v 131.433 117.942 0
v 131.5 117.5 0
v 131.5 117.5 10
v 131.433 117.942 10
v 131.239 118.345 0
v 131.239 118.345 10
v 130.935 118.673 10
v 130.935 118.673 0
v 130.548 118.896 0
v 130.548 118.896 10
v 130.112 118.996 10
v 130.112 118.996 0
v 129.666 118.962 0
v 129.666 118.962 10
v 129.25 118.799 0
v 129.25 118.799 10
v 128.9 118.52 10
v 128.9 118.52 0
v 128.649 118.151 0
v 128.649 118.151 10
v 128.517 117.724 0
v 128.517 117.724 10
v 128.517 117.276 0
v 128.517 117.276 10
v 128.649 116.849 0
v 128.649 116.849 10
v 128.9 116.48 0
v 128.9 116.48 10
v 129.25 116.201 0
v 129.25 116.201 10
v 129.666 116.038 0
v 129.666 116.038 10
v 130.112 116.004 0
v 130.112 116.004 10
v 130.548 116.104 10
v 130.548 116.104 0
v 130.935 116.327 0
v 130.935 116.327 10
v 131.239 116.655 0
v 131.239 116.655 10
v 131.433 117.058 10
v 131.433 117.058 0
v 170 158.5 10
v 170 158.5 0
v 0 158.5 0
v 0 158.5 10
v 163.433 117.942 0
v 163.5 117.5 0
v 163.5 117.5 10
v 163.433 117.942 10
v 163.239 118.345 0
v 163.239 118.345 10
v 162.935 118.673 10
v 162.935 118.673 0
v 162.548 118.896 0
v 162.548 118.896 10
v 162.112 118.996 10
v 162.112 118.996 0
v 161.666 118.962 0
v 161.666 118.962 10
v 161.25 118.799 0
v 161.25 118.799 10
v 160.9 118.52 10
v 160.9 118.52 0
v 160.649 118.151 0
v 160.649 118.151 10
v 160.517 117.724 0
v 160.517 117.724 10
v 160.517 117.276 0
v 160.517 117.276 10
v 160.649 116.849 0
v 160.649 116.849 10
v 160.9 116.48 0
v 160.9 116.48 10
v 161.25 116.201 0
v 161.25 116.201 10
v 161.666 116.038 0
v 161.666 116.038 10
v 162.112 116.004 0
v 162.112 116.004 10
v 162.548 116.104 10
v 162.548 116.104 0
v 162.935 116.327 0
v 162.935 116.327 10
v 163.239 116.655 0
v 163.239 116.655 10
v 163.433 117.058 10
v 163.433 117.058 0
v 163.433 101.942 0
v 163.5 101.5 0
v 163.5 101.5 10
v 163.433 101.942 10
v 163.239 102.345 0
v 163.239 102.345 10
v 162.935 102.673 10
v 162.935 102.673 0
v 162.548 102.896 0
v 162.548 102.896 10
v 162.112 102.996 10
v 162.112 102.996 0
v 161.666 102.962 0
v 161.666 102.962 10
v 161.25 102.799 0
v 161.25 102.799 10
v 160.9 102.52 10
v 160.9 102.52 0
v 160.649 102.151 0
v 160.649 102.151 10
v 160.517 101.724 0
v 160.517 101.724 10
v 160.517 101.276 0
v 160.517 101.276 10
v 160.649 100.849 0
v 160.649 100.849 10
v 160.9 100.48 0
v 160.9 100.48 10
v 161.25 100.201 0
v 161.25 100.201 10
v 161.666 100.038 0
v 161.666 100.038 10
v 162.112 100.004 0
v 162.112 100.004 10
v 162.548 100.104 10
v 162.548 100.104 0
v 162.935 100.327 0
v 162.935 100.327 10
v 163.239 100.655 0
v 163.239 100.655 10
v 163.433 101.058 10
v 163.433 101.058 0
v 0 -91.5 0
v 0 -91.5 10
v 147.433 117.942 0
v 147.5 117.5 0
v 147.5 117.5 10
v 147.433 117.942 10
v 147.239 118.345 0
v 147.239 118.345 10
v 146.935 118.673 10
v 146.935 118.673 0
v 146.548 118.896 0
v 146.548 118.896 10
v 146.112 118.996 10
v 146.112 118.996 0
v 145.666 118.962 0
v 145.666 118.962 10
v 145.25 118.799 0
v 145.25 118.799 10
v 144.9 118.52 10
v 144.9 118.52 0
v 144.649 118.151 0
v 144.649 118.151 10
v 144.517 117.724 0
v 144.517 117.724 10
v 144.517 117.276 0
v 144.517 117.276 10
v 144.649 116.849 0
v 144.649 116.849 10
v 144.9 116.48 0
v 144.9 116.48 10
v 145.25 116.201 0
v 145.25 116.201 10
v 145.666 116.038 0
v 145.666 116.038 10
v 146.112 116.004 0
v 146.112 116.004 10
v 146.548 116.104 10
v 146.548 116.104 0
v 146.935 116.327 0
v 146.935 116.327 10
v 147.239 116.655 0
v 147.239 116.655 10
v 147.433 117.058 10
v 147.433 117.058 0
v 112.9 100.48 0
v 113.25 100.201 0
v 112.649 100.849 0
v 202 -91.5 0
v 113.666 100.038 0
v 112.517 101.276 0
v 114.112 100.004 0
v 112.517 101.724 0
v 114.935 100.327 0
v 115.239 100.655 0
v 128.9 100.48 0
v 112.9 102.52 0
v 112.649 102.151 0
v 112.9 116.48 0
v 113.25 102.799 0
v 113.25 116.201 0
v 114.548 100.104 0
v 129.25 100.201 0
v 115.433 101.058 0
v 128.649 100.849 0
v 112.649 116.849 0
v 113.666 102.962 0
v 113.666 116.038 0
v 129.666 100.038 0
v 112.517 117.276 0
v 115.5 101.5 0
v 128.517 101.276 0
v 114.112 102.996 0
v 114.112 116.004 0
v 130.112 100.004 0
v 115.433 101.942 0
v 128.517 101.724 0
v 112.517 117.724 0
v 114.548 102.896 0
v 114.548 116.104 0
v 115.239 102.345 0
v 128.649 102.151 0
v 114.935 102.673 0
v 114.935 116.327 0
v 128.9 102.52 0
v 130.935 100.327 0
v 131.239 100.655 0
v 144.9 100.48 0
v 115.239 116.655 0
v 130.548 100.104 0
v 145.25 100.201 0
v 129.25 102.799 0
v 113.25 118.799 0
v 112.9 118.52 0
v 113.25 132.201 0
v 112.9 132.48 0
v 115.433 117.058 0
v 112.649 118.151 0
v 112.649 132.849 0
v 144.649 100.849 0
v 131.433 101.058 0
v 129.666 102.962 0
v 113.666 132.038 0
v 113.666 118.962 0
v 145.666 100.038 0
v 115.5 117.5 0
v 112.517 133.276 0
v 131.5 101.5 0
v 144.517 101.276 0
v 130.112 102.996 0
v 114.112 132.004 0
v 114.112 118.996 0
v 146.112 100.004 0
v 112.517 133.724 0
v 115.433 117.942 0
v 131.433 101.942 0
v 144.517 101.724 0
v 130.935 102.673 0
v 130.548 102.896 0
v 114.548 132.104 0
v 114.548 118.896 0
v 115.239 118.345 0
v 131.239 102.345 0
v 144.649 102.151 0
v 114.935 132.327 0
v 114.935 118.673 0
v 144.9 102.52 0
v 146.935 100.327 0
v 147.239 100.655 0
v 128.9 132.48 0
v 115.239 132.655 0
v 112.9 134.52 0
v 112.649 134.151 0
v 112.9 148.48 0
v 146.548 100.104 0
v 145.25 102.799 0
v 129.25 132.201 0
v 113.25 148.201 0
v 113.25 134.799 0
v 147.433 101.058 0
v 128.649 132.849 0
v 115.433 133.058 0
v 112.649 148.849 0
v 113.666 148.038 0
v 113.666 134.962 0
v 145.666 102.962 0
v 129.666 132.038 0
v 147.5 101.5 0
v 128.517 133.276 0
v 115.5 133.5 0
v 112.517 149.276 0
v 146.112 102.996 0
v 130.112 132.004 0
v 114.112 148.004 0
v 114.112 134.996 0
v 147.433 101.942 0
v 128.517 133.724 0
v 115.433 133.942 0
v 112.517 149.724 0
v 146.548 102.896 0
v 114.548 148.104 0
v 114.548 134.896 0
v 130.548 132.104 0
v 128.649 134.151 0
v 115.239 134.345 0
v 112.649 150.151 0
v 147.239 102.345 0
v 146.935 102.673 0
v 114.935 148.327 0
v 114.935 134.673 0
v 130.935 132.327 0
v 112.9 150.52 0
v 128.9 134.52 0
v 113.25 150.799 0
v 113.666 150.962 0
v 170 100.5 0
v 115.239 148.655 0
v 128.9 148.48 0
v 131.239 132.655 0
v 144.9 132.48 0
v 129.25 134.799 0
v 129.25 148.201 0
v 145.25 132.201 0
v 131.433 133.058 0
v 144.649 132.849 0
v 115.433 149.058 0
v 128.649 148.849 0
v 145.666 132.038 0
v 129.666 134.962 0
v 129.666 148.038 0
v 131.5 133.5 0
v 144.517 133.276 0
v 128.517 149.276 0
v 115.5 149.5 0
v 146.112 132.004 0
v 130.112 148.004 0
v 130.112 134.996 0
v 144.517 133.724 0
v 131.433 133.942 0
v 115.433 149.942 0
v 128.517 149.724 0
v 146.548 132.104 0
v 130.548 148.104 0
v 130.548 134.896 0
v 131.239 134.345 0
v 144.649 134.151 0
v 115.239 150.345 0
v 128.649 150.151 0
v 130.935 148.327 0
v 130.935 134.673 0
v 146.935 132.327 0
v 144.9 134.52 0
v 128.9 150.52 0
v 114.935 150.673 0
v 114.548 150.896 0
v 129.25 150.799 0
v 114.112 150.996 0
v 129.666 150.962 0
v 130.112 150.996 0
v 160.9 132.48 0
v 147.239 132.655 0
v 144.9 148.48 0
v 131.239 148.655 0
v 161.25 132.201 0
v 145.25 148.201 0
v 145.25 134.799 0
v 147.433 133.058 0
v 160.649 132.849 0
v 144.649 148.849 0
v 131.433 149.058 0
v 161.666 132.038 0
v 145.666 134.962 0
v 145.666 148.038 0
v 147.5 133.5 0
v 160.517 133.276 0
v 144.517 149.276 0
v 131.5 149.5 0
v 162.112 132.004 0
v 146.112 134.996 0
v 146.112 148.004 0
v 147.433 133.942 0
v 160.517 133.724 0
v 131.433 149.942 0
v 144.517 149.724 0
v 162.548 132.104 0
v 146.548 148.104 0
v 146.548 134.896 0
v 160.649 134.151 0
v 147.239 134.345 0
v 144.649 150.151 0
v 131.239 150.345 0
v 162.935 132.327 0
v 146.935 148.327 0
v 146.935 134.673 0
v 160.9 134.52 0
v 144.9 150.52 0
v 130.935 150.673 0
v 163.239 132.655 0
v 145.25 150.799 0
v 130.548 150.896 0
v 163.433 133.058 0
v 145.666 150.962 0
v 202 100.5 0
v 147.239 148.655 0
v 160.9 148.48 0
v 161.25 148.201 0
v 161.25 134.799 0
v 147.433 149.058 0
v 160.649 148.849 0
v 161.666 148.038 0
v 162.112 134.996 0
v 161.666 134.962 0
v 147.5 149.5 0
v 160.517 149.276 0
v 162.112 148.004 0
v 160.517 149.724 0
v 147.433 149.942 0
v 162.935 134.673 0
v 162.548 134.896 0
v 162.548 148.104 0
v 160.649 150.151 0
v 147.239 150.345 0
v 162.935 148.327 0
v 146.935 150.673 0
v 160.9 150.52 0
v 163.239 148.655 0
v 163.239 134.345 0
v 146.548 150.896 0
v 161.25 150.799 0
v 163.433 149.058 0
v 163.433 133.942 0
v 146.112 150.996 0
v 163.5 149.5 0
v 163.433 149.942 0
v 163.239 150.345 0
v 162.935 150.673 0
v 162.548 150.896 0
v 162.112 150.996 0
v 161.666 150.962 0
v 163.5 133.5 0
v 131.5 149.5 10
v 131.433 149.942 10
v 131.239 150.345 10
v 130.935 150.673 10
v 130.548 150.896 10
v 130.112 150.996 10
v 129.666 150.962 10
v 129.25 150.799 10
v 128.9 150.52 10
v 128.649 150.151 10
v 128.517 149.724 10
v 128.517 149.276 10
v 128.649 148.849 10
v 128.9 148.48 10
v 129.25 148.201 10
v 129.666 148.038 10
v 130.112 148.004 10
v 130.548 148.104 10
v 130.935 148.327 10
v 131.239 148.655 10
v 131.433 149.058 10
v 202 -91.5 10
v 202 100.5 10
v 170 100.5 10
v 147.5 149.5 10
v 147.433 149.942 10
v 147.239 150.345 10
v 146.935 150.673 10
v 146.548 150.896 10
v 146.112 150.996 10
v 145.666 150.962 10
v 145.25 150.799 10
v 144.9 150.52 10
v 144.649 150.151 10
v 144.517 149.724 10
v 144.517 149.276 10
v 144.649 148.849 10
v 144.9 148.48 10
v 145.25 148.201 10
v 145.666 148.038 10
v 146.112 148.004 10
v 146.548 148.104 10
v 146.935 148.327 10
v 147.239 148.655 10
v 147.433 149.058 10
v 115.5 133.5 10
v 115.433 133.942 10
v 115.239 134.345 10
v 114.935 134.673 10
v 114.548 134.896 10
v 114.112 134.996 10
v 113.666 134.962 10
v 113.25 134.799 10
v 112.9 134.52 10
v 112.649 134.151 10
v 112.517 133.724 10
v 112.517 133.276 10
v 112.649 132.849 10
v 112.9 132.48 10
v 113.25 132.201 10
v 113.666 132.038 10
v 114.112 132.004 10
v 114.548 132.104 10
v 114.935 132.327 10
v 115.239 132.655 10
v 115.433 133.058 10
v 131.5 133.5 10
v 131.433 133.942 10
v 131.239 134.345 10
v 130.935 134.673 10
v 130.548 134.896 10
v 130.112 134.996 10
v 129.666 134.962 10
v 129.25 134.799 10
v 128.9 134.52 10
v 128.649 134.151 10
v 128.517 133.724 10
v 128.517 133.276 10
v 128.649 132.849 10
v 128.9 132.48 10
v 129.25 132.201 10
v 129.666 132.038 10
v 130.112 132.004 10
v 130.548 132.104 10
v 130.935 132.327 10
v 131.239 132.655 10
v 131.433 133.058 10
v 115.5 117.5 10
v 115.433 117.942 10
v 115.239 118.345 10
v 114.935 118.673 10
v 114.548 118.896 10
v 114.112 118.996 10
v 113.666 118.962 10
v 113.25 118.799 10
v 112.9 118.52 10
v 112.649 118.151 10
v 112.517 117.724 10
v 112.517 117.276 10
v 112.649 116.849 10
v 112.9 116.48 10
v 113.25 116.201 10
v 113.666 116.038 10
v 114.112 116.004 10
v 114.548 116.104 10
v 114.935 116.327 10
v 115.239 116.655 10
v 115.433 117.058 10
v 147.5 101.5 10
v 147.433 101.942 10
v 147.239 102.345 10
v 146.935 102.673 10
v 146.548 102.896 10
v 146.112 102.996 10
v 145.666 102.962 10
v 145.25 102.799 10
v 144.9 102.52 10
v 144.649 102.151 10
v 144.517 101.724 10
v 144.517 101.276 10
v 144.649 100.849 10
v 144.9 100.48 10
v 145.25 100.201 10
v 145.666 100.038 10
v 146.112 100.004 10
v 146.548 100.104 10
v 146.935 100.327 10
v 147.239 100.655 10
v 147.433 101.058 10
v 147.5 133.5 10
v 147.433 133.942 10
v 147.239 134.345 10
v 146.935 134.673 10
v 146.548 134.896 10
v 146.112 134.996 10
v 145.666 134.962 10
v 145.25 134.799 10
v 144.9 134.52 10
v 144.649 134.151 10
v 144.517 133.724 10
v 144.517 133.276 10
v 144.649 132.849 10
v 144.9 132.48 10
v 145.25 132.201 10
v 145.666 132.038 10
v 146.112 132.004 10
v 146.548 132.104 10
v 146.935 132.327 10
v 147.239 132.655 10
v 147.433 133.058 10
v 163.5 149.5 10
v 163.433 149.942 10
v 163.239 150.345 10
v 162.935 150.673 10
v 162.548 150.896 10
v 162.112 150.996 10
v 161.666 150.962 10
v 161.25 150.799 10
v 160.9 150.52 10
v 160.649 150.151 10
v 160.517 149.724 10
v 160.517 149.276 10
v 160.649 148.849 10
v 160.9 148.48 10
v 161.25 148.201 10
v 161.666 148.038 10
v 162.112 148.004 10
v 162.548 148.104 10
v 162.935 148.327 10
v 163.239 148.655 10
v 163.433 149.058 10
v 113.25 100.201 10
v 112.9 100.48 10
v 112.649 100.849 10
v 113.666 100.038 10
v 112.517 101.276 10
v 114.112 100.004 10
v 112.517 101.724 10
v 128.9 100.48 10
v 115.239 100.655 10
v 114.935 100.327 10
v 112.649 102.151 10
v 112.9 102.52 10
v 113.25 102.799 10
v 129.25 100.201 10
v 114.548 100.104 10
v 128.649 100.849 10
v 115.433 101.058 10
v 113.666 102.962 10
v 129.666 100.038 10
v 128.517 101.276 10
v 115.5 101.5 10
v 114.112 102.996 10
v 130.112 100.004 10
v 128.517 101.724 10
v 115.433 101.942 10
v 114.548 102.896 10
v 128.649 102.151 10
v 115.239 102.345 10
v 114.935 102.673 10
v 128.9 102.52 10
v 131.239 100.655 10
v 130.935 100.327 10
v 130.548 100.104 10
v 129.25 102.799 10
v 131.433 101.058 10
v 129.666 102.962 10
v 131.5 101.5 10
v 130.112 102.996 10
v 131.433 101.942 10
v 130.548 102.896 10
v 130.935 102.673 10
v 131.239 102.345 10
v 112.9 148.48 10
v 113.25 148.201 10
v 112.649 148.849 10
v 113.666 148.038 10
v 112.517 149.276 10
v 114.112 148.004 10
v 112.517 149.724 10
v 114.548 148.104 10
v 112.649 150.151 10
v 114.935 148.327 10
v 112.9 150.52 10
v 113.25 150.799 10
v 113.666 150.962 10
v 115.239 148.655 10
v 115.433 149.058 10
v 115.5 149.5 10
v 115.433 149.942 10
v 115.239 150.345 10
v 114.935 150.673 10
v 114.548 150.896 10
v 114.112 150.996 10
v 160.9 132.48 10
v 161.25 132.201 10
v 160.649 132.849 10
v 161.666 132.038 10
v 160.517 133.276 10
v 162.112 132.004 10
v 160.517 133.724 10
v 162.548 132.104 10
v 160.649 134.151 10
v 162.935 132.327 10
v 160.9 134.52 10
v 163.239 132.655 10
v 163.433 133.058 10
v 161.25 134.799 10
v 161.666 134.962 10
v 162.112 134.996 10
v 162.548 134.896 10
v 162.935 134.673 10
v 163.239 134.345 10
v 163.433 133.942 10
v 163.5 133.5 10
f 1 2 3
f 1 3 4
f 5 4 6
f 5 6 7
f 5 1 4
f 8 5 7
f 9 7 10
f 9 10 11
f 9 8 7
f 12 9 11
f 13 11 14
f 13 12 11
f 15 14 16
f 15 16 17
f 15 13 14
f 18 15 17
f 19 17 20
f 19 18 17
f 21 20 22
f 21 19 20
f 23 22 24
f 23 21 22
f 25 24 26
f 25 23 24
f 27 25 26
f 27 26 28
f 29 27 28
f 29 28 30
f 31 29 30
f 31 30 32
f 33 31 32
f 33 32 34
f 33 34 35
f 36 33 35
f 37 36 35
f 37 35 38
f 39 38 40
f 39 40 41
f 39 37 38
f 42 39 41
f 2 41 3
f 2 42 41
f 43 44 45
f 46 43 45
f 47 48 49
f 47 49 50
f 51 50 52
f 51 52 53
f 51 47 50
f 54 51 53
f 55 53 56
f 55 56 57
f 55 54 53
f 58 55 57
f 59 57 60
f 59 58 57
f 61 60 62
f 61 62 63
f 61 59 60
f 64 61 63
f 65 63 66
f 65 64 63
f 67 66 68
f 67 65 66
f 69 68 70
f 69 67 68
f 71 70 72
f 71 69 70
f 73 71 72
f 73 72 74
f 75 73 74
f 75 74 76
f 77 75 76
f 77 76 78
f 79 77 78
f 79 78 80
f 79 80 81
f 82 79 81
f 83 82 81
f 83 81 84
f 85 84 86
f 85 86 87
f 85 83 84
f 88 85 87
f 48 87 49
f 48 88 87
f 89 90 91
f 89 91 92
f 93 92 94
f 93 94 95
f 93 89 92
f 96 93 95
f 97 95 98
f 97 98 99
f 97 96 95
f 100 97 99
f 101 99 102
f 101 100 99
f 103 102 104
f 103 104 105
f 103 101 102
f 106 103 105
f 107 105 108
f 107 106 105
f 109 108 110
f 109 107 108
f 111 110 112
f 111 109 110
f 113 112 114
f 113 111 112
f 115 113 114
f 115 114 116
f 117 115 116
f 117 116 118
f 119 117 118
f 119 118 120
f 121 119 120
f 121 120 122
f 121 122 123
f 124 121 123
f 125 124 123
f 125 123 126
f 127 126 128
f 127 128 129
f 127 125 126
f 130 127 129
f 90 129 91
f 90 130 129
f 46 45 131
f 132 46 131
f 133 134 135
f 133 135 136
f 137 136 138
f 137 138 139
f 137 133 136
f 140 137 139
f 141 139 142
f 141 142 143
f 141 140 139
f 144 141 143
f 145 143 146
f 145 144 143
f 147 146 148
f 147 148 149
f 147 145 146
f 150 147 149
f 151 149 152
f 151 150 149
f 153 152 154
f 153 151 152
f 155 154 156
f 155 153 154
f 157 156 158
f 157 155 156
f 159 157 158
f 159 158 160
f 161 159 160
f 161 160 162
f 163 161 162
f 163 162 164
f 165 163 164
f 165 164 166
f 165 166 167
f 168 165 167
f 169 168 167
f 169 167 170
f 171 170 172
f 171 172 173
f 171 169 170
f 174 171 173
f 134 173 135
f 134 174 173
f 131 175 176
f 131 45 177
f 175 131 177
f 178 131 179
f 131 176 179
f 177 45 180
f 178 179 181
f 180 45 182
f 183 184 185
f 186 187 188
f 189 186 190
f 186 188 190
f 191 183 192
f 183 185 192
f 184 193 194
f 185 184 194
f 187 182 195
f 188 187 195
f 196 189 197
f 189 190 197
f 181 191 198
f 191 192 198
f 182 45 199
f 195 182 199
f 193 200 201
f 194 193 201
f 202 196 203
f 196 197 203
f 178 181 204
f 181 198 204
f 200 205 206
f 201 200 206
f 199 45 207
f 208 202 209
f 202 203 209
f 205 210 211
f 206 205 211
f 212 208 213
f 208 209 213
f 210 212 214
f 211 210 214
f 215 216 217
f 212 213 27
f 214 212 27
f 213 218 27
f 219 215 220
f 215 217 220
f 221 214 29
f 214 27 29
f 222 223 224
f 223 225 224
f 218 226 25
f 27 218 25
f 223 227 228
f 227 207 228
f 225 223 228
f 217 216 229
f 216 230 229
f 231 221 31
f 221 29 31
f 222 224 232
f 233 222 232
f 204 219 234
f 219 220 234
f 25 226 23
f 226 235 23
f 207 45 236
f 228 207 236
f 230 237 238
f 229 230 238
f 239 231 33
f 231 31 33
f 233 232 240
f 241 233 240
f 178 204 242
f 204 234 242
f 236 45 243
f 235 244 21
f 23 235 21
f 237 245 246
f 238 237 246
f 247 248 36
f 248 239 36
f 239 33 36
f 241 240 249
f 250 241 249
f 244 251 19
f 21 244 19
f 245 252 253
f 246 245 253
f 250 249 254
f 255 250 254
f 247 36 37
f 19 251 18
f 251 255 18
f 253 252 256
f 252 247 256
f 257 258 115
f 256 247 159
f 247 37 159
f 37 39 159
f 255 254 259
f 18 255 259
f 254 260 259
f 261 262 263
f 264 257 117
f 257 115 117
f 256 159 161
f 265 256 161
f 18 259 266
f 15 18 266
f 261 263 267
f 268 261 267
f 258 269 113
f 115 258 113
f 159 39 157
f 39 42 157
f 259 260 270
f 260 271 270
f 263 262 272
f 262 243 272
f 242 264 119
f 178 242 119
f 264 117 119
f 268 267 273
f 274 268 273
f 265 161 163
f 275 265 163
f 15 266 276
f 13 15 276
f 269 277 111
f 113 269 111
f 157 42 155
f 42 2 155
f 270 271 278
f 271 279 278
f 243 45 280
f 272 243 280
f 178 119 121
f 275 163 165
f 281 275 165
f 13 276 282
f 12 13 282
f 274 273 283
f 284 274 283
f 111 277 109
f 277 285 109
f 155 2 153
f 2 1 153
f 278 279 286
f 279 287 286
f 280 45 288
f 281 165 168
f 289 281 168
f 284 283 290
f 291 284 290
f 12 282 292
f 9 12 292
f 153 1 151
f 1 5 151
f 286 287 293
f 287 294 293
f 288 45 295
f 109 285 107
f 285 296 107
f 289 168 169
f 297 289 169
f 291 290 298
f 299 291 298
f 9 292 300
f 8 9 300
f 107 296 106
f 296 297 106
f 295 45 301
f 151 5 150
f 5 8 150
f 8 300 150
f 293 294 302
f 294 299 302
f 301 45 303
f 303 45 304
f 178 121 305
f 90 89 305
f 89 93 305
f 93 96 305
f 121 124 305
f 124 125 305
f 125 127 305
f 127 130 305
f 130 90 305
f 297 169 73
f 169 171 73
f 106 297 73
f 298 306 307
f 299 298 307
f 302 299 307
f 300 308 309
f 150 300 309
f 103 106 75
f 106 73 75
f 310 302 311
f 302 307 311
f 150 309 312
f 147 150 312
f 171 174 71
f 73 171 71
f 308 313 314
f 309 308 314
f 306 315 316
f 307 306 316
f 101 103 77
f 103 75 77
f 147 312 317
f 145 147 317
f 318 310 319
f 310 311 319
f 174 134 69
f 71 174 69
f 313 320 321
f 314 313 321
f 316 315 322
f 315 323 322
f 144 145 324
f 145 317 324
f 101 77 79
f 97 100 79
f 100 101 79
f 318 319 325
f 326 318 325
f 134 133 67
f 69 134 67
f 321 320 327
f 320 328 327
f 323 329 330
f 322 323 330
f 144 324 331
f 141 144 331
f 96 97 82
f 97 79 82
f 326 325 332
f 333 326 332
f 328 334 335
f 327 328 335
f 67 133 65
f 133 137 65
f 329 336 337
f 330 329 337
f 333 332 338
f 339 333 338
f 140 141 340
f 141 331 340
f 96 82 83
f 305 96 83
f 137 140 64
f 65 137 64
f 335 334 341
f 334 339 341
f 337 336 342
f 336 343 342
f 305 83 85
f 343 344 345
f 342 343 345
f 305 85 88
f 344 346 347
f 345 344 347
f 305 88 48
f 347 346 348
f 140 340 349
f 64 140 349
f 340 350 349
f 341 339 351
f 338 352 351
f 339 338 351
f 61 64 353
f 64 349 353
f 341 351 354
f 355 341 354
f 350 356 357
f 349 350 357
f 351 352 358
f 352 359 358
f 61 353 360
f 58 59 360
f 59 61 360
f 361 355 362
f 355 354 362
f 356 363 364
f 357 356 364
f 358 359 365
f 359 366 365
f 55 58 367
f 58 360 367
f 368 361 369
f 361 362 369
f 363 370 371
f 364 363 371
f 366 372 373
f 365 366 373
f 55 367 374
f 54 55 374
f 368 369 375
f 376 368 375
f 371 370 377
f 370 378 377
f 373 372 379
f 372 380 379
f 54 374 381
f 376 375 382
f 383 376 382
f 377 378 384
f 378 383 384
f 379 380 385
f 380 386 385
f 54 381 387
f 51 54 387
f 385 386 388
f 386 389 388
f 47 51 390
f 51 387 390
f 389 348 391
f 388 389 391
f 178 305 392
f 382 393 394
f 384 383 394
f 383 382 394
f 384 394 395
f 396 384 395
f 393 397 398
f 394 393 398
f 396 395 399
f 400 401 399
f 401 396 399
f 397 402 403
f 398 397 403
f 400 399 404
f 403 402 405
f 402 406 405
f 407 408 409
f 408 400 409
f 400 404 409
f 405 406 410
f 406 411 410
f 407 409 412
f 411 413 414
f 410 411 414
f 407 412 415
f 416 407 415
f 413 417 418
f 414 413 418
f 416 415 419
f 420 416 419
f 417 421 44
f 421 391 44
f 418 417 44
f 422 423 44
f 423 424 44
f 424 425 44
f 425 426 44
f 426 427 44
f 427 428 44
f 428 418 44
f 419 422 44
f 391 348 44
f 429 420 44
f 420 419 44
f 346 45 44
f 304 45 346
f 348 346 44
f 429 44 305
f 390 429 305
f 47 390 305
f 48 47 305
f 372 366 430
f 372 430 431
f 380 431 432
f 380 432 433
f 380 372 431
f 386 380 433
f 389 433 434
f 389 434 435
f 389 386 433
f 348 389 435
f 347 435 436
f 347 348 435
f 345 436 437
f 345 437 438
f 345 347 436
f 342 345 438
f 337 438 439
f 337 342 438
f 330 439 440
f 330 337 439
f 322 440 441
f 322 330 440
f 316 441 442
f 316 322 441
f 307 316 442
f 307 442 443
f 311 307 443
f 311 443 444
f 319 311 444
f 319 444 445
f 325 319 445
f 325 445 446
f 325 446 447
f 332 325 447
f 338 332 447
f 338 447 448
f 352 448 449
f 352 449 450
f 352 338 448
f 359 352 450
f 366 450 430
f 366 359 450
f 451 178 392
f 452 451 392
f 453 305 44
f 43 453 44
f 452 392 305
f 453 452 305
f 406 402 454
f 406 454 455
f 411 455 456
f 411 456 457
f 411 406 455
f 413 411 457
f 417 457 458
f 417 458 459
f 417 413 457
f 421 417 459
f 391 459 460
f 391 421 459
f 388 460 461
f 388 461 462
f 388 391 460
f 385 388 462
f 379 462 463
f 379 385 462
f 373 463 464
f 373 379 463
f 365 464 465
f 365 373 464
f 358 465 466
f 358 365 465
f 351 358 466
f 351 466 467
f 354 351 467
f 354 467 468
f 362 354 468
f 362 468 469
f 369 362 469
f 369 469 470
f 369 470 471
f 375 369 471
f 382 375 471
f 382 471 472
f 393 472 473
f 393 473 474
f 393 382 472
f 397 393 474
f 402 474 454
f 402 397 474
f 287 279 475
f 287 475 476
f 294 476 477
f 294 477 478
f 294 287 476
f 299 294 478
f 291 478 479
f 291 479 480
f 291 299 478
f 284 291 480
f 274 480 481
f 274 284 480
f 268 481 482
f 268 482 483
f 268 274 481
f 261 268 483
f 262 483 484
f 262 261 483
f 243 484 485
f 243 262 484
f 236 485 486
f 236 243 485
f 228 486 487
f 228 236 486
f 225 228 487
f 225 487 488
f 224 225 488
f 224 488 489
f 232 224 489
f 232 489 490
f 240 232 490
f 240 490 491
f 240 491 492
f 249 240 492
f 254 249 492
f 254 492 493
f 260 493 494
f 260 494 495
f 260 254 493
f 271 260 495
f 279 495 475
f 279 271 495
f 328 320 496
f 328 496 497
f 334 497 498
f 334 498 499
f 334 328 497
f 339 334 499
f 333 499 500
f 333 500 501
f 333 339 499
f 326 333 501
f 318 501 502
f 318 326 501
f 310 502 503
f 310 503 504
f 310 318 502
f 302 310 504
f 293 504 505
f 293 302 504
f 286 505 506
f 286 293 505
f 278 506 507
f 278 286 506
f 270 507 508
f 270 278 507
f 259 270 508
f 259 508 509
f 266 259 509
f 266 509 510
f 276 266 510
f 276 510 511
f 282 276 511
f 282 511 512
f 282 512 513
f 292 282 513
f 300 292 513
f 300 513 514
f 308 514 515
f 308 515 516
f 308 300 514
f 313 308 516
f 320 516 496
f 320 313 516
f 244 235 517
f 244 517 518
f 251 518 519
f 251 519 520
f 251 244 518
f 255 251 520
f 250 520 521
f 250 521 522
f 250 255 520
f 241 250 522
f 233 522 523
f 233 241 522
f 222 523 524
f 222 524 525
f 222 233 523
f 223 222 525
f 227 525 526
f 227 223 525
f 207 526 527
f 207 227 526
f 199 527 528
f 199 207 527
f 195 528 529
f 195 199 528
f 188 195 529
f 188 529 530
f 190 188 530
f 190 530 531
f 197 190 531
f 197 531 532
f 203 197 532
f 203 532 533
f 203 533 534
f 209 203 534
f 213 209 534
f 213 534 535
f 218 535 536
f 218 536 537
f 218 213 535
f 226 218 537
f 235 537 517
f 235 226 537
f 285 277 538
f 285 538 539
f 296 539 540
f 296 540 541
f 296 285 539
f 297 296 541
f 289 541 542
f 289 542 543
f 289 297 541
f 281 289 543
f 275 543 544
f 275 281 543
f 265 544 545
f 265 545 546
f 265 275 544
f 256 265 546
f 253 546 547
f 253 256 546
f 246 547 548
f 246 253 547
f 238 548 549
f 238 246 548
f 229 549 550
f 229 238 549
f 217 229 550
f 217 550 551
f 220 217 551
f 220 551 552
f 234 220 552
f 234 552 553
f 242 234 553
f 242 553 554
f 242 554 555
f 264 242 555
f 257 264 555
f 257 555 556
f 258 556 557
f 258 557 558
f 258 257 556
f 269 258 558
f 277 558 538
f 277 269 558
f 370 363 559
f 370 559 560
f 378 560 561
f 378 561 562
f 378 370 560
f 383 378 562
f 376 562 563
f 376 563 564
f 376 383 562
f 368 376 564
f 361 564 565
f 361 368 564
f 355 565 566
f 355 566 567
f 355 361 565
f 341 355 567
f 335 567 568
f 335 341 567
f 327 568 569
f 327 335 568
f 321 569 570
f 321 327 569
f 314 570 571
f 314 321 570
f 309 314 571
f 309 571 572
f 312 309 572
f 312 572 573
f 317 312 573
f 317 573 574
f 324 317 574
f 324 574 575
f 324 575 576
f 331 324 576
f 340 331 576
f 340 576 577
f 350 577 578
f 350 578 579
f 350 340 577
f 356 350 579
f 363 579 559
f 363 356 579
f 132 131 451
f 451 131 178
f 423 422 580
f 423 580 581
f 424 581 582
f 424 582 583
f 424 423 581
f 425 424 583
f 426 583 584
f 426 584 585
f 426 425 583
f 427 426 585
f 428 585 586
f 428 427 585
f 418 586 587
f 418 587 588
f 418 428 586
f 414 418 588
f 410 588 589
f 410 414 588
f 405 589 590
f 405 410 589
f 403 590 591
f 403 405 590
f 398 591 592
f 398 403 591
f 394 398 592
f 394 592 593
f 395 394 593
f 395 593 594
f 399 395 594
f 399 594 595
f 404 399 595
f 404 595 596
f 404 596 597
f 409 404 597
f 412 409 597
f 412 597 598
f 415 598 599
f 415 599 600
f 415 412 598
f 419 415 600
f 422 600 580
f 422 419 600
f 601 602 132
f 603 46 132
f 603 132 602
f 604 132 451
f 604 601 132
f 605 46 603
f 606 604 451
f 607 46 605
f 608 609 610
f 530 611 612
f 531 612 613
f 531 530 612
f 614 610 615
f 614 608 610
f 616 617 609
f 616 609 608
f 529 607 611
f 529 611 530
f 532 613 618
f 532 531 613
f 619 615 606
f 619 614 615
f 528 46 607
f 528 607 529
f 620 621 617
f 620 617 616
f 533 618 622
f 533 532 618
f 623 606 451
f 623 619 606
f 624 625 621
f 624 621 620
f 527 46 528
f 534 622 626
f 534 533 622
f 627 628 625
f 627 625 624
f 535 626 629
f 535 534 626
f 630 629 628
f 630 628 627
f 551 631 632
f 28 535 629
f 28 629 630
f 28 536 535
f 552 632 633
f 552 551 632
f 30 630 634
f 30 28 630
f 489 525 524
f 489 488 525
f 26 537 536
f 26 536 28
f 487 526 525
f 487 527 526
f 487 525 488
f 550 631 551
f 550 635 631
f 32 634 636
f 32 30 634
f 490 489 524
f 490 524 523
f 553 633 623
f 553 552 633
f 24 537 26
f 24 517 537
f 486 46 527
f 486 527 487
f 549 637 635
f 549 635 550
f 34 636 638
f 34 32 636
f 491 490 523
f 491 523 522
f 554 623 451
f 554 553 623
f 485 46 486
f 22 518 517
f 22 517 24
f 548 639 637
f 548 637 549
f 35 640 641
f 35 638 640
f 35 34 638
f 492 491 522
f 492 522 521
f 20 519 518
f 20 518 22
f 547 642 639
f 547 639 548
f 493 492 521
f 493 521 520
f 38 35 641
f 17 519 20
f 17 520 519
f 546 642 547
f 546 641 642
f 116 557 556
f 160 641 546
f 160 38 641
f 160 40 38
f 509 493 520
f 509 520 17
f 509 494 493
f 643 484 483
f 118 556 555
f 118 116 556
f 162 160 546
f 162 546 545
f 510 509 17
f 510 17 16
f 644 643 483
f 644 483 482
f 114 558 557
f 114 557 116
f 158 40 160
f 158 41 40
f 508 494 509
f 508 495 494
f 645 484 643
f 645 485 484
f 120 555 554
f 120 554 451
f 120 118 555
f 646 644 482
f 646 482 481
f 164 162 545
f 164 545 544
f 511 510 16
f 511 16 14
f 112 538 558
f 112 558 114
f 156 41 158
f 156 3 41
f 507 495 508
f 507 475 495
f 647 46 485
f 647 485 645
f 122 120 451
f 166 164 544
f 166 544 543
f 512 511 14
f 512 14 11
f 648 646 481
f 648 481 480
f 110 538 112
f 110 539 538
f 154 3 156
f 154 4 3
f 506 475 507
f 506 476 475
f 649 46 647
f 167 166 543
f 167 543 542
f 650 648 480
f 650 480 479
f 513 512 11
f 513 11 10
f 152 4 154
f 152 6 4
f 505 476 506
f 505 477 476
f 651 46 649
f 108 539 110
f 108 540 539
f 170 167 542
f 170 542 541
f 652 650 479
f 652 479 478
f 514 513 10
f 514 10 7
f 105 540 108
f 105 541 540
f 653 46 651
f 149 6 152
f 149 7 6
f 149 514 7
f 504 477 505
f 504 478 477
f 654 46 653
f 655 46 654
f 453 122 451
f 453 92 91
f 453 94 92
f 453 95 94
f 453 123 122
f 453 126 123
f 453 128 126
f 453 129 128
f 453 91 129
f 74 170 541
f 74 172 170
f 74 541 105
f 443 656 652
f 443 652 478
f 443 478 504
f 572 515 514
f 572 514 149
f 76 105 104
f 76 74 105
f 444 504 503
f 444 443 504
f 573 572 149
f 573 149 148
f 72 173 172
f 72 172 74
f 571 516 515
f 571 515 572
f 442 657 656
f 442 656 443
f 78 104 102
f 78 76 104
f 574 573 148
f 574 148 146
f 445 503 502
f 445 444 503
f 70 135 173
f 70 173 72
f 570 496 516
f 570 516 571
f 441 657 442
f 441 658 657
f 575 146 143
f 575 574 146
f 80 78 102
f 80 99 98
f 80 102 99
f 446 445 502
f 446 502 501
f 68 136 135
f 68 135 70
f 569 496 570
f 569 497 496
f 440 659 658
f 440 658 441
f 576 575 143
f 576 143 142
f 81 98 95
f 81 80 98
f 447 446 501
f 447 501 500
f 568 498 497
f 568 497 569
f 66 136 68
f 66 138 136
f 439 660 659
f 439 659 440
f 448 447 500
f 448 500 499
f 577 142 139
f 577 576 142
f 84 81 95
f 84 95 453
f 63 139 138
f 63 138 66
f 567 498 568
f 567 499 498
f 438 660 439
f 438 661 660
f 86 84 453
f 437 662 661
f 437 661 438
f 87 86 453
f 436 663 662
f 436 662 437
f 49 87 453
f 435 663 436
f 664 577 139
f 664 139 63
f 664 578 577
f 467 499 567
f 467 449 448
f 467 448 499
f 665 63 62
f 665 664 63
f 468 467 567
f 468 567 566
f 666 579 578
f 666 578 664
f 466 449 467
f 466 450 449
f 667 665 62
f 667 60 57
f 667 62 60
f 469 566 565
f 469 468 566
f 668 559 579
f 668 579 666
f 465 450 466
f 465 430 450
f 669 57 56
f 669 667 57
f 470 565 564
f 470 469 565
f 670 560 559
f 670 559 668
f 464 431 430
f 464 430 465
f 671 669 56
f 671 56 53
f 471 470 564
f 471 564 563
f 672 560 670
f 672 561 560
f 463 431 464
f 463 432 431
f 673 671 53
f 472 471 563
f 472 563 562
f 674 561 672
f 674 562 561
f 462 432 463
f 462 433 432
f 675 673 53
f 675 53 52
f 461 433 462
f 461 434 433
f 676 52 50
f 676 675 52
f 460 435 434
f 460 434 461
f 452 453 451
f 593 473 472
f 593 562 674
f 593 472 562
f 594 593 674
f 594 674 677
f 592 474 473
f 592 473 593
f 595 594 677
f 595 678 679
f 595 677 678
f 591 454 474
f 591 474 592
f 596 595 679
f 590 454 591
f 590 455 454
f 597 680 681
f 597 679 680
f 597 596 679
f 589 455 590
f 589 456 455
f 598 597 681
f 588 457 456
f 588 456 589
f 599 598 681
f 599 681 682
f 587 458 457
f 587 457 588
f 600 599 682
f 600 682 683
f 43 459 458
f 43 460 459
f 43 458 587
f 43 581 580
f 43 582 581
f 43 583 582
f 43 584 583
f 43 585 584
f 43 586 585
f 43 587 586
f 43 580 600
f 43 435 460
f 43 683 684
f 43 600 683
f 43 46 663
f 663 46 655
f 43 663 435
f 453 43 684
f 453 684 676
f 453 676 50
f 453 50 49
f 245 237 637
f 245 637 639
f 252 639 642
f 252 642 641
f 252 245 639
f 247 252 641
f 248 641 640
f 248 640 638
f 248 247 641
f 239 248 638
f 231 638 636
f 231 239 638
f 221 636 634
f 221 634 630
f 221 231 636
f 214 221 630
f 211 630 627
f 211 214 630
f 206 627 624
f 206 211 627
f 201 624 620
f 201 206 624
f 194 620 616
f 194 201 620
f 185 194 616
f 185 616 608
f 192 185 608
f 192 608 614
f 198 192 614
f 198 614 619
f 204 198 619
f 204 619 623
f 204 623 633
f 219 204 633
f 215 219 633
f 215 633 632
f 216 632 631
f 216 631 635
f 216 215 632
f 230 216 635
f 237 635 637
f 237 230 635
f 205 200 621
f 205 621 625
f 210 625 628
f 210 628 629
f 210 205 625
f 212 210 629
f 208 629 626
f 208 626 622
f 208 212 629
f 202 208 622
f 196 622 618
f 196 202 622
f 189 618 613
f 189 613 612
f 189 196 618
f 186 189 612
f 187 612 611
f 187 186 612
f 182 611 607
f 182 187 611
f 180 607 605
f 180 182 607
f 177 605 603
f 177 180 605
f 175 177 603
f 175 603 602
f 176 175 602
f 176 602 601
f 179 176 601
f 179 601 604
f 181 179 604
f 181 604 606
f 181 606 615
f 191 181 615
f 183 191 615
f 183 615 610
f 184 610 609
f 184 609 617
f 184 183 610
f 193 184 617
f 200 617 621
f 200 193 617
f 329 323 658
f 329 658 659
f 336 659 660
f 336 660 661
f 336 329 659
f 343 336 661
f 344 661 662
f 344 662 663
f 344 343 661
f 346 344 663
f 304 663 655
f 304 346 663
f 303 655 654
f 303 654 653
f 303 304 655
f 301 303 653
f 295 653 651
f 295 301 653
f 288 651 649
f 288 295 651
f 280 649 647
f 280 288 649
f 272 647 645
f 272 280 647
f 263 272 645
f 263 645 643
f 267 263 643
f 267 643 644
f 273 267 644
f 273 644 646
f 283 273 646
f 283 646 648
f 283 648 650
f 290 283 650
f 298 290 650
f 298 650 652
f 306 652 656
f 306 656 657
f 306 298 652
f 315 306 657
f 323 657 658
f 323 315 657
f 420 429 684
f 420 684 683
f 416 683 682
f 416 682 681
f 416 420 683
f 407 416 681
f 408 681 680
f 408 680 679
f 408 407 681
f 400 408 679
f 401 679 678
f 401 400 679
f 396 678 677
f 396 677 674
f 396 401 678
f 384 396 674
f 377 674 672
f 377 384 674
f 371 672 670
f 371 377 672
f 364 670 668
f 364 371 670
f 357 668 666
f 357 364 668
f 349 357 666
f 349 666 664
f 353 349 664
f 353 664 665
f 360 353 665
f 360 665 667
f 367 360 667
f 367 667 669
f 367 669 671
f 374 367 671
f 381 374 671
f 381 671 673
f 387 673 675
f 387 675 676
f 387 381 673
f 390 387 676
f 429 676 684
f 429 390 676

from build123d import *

# Parameters (mm, degrees)
F0_R     = 1.5
F1_DEPTH = 10


with BuildPart() as f1:
    # F0 (on Top) → F1 (new body)
    with BuildSketch(Plane.XY):
        Polygon((170, 158.5), (0, 158.5), (0, -91.5), (202, -91.5), (202, 100.5), (170, 100.5), align=None)
        with Locations((114, 101.5)):
            Circle(F0_R, mode=Mode.SUBTRACT)
        with Locations((114, 117.5)):
            Circle(F0_R, mode=Mode.SUBTRACT)
        with Locations((130, 101.5)):
            Circle(F0_R, mode=Mode.SUBTRACT)
        with Locations((146, 101.5)):
            Circle(F0_R, mode=Mode.SUBTRACT)
        with Locations((130, 117.5)):
            Circle(F0_R, mode=Mode.SUBTRACT)
        with Locations((146, 117.5)):
            Circle(F0_R, mode=Mode.SUBTRACT)
        with Locations((114, 133.5)):
            Circle(F0_R, mode=Mode.SUBTRACT)
        with Locations((114, 149.5)):
            Circle(F0_R, mode=Mode.SUBTRACT)
        with Locations((130, 133.5)):
            Circle(F0_R, mode=Mode.SUBTRACT)
        with Locations((146, 133.5)):
            Circle(F0_R, mode=Mode.SUBTRACT)
        with Locations((130, 149.5)):
            Circle(F0_R, mode=Mode.SUBTRACT)
        with Locations((146, 149.5)):
            Circle(F0_R, mode=Mode.SUBTRACT)
        with Locations((162, 101.5)):
            Circle(F0_R, mode=Mode.SUBTRACT)
        with Locations((162, 117.5)):
            Circle(F0_R, mode=Mode.SUBTRACT)
        with Locations((162, 133.5)):
            Circle(F0_R, mode=Mode.SUBTRACT)
        with Locations((162, 149.5)):
            Circle(F0_R, mode=Mode.SUBTRACT)
    extrude(amount=F1_DEPTH)


solid = f1.part
